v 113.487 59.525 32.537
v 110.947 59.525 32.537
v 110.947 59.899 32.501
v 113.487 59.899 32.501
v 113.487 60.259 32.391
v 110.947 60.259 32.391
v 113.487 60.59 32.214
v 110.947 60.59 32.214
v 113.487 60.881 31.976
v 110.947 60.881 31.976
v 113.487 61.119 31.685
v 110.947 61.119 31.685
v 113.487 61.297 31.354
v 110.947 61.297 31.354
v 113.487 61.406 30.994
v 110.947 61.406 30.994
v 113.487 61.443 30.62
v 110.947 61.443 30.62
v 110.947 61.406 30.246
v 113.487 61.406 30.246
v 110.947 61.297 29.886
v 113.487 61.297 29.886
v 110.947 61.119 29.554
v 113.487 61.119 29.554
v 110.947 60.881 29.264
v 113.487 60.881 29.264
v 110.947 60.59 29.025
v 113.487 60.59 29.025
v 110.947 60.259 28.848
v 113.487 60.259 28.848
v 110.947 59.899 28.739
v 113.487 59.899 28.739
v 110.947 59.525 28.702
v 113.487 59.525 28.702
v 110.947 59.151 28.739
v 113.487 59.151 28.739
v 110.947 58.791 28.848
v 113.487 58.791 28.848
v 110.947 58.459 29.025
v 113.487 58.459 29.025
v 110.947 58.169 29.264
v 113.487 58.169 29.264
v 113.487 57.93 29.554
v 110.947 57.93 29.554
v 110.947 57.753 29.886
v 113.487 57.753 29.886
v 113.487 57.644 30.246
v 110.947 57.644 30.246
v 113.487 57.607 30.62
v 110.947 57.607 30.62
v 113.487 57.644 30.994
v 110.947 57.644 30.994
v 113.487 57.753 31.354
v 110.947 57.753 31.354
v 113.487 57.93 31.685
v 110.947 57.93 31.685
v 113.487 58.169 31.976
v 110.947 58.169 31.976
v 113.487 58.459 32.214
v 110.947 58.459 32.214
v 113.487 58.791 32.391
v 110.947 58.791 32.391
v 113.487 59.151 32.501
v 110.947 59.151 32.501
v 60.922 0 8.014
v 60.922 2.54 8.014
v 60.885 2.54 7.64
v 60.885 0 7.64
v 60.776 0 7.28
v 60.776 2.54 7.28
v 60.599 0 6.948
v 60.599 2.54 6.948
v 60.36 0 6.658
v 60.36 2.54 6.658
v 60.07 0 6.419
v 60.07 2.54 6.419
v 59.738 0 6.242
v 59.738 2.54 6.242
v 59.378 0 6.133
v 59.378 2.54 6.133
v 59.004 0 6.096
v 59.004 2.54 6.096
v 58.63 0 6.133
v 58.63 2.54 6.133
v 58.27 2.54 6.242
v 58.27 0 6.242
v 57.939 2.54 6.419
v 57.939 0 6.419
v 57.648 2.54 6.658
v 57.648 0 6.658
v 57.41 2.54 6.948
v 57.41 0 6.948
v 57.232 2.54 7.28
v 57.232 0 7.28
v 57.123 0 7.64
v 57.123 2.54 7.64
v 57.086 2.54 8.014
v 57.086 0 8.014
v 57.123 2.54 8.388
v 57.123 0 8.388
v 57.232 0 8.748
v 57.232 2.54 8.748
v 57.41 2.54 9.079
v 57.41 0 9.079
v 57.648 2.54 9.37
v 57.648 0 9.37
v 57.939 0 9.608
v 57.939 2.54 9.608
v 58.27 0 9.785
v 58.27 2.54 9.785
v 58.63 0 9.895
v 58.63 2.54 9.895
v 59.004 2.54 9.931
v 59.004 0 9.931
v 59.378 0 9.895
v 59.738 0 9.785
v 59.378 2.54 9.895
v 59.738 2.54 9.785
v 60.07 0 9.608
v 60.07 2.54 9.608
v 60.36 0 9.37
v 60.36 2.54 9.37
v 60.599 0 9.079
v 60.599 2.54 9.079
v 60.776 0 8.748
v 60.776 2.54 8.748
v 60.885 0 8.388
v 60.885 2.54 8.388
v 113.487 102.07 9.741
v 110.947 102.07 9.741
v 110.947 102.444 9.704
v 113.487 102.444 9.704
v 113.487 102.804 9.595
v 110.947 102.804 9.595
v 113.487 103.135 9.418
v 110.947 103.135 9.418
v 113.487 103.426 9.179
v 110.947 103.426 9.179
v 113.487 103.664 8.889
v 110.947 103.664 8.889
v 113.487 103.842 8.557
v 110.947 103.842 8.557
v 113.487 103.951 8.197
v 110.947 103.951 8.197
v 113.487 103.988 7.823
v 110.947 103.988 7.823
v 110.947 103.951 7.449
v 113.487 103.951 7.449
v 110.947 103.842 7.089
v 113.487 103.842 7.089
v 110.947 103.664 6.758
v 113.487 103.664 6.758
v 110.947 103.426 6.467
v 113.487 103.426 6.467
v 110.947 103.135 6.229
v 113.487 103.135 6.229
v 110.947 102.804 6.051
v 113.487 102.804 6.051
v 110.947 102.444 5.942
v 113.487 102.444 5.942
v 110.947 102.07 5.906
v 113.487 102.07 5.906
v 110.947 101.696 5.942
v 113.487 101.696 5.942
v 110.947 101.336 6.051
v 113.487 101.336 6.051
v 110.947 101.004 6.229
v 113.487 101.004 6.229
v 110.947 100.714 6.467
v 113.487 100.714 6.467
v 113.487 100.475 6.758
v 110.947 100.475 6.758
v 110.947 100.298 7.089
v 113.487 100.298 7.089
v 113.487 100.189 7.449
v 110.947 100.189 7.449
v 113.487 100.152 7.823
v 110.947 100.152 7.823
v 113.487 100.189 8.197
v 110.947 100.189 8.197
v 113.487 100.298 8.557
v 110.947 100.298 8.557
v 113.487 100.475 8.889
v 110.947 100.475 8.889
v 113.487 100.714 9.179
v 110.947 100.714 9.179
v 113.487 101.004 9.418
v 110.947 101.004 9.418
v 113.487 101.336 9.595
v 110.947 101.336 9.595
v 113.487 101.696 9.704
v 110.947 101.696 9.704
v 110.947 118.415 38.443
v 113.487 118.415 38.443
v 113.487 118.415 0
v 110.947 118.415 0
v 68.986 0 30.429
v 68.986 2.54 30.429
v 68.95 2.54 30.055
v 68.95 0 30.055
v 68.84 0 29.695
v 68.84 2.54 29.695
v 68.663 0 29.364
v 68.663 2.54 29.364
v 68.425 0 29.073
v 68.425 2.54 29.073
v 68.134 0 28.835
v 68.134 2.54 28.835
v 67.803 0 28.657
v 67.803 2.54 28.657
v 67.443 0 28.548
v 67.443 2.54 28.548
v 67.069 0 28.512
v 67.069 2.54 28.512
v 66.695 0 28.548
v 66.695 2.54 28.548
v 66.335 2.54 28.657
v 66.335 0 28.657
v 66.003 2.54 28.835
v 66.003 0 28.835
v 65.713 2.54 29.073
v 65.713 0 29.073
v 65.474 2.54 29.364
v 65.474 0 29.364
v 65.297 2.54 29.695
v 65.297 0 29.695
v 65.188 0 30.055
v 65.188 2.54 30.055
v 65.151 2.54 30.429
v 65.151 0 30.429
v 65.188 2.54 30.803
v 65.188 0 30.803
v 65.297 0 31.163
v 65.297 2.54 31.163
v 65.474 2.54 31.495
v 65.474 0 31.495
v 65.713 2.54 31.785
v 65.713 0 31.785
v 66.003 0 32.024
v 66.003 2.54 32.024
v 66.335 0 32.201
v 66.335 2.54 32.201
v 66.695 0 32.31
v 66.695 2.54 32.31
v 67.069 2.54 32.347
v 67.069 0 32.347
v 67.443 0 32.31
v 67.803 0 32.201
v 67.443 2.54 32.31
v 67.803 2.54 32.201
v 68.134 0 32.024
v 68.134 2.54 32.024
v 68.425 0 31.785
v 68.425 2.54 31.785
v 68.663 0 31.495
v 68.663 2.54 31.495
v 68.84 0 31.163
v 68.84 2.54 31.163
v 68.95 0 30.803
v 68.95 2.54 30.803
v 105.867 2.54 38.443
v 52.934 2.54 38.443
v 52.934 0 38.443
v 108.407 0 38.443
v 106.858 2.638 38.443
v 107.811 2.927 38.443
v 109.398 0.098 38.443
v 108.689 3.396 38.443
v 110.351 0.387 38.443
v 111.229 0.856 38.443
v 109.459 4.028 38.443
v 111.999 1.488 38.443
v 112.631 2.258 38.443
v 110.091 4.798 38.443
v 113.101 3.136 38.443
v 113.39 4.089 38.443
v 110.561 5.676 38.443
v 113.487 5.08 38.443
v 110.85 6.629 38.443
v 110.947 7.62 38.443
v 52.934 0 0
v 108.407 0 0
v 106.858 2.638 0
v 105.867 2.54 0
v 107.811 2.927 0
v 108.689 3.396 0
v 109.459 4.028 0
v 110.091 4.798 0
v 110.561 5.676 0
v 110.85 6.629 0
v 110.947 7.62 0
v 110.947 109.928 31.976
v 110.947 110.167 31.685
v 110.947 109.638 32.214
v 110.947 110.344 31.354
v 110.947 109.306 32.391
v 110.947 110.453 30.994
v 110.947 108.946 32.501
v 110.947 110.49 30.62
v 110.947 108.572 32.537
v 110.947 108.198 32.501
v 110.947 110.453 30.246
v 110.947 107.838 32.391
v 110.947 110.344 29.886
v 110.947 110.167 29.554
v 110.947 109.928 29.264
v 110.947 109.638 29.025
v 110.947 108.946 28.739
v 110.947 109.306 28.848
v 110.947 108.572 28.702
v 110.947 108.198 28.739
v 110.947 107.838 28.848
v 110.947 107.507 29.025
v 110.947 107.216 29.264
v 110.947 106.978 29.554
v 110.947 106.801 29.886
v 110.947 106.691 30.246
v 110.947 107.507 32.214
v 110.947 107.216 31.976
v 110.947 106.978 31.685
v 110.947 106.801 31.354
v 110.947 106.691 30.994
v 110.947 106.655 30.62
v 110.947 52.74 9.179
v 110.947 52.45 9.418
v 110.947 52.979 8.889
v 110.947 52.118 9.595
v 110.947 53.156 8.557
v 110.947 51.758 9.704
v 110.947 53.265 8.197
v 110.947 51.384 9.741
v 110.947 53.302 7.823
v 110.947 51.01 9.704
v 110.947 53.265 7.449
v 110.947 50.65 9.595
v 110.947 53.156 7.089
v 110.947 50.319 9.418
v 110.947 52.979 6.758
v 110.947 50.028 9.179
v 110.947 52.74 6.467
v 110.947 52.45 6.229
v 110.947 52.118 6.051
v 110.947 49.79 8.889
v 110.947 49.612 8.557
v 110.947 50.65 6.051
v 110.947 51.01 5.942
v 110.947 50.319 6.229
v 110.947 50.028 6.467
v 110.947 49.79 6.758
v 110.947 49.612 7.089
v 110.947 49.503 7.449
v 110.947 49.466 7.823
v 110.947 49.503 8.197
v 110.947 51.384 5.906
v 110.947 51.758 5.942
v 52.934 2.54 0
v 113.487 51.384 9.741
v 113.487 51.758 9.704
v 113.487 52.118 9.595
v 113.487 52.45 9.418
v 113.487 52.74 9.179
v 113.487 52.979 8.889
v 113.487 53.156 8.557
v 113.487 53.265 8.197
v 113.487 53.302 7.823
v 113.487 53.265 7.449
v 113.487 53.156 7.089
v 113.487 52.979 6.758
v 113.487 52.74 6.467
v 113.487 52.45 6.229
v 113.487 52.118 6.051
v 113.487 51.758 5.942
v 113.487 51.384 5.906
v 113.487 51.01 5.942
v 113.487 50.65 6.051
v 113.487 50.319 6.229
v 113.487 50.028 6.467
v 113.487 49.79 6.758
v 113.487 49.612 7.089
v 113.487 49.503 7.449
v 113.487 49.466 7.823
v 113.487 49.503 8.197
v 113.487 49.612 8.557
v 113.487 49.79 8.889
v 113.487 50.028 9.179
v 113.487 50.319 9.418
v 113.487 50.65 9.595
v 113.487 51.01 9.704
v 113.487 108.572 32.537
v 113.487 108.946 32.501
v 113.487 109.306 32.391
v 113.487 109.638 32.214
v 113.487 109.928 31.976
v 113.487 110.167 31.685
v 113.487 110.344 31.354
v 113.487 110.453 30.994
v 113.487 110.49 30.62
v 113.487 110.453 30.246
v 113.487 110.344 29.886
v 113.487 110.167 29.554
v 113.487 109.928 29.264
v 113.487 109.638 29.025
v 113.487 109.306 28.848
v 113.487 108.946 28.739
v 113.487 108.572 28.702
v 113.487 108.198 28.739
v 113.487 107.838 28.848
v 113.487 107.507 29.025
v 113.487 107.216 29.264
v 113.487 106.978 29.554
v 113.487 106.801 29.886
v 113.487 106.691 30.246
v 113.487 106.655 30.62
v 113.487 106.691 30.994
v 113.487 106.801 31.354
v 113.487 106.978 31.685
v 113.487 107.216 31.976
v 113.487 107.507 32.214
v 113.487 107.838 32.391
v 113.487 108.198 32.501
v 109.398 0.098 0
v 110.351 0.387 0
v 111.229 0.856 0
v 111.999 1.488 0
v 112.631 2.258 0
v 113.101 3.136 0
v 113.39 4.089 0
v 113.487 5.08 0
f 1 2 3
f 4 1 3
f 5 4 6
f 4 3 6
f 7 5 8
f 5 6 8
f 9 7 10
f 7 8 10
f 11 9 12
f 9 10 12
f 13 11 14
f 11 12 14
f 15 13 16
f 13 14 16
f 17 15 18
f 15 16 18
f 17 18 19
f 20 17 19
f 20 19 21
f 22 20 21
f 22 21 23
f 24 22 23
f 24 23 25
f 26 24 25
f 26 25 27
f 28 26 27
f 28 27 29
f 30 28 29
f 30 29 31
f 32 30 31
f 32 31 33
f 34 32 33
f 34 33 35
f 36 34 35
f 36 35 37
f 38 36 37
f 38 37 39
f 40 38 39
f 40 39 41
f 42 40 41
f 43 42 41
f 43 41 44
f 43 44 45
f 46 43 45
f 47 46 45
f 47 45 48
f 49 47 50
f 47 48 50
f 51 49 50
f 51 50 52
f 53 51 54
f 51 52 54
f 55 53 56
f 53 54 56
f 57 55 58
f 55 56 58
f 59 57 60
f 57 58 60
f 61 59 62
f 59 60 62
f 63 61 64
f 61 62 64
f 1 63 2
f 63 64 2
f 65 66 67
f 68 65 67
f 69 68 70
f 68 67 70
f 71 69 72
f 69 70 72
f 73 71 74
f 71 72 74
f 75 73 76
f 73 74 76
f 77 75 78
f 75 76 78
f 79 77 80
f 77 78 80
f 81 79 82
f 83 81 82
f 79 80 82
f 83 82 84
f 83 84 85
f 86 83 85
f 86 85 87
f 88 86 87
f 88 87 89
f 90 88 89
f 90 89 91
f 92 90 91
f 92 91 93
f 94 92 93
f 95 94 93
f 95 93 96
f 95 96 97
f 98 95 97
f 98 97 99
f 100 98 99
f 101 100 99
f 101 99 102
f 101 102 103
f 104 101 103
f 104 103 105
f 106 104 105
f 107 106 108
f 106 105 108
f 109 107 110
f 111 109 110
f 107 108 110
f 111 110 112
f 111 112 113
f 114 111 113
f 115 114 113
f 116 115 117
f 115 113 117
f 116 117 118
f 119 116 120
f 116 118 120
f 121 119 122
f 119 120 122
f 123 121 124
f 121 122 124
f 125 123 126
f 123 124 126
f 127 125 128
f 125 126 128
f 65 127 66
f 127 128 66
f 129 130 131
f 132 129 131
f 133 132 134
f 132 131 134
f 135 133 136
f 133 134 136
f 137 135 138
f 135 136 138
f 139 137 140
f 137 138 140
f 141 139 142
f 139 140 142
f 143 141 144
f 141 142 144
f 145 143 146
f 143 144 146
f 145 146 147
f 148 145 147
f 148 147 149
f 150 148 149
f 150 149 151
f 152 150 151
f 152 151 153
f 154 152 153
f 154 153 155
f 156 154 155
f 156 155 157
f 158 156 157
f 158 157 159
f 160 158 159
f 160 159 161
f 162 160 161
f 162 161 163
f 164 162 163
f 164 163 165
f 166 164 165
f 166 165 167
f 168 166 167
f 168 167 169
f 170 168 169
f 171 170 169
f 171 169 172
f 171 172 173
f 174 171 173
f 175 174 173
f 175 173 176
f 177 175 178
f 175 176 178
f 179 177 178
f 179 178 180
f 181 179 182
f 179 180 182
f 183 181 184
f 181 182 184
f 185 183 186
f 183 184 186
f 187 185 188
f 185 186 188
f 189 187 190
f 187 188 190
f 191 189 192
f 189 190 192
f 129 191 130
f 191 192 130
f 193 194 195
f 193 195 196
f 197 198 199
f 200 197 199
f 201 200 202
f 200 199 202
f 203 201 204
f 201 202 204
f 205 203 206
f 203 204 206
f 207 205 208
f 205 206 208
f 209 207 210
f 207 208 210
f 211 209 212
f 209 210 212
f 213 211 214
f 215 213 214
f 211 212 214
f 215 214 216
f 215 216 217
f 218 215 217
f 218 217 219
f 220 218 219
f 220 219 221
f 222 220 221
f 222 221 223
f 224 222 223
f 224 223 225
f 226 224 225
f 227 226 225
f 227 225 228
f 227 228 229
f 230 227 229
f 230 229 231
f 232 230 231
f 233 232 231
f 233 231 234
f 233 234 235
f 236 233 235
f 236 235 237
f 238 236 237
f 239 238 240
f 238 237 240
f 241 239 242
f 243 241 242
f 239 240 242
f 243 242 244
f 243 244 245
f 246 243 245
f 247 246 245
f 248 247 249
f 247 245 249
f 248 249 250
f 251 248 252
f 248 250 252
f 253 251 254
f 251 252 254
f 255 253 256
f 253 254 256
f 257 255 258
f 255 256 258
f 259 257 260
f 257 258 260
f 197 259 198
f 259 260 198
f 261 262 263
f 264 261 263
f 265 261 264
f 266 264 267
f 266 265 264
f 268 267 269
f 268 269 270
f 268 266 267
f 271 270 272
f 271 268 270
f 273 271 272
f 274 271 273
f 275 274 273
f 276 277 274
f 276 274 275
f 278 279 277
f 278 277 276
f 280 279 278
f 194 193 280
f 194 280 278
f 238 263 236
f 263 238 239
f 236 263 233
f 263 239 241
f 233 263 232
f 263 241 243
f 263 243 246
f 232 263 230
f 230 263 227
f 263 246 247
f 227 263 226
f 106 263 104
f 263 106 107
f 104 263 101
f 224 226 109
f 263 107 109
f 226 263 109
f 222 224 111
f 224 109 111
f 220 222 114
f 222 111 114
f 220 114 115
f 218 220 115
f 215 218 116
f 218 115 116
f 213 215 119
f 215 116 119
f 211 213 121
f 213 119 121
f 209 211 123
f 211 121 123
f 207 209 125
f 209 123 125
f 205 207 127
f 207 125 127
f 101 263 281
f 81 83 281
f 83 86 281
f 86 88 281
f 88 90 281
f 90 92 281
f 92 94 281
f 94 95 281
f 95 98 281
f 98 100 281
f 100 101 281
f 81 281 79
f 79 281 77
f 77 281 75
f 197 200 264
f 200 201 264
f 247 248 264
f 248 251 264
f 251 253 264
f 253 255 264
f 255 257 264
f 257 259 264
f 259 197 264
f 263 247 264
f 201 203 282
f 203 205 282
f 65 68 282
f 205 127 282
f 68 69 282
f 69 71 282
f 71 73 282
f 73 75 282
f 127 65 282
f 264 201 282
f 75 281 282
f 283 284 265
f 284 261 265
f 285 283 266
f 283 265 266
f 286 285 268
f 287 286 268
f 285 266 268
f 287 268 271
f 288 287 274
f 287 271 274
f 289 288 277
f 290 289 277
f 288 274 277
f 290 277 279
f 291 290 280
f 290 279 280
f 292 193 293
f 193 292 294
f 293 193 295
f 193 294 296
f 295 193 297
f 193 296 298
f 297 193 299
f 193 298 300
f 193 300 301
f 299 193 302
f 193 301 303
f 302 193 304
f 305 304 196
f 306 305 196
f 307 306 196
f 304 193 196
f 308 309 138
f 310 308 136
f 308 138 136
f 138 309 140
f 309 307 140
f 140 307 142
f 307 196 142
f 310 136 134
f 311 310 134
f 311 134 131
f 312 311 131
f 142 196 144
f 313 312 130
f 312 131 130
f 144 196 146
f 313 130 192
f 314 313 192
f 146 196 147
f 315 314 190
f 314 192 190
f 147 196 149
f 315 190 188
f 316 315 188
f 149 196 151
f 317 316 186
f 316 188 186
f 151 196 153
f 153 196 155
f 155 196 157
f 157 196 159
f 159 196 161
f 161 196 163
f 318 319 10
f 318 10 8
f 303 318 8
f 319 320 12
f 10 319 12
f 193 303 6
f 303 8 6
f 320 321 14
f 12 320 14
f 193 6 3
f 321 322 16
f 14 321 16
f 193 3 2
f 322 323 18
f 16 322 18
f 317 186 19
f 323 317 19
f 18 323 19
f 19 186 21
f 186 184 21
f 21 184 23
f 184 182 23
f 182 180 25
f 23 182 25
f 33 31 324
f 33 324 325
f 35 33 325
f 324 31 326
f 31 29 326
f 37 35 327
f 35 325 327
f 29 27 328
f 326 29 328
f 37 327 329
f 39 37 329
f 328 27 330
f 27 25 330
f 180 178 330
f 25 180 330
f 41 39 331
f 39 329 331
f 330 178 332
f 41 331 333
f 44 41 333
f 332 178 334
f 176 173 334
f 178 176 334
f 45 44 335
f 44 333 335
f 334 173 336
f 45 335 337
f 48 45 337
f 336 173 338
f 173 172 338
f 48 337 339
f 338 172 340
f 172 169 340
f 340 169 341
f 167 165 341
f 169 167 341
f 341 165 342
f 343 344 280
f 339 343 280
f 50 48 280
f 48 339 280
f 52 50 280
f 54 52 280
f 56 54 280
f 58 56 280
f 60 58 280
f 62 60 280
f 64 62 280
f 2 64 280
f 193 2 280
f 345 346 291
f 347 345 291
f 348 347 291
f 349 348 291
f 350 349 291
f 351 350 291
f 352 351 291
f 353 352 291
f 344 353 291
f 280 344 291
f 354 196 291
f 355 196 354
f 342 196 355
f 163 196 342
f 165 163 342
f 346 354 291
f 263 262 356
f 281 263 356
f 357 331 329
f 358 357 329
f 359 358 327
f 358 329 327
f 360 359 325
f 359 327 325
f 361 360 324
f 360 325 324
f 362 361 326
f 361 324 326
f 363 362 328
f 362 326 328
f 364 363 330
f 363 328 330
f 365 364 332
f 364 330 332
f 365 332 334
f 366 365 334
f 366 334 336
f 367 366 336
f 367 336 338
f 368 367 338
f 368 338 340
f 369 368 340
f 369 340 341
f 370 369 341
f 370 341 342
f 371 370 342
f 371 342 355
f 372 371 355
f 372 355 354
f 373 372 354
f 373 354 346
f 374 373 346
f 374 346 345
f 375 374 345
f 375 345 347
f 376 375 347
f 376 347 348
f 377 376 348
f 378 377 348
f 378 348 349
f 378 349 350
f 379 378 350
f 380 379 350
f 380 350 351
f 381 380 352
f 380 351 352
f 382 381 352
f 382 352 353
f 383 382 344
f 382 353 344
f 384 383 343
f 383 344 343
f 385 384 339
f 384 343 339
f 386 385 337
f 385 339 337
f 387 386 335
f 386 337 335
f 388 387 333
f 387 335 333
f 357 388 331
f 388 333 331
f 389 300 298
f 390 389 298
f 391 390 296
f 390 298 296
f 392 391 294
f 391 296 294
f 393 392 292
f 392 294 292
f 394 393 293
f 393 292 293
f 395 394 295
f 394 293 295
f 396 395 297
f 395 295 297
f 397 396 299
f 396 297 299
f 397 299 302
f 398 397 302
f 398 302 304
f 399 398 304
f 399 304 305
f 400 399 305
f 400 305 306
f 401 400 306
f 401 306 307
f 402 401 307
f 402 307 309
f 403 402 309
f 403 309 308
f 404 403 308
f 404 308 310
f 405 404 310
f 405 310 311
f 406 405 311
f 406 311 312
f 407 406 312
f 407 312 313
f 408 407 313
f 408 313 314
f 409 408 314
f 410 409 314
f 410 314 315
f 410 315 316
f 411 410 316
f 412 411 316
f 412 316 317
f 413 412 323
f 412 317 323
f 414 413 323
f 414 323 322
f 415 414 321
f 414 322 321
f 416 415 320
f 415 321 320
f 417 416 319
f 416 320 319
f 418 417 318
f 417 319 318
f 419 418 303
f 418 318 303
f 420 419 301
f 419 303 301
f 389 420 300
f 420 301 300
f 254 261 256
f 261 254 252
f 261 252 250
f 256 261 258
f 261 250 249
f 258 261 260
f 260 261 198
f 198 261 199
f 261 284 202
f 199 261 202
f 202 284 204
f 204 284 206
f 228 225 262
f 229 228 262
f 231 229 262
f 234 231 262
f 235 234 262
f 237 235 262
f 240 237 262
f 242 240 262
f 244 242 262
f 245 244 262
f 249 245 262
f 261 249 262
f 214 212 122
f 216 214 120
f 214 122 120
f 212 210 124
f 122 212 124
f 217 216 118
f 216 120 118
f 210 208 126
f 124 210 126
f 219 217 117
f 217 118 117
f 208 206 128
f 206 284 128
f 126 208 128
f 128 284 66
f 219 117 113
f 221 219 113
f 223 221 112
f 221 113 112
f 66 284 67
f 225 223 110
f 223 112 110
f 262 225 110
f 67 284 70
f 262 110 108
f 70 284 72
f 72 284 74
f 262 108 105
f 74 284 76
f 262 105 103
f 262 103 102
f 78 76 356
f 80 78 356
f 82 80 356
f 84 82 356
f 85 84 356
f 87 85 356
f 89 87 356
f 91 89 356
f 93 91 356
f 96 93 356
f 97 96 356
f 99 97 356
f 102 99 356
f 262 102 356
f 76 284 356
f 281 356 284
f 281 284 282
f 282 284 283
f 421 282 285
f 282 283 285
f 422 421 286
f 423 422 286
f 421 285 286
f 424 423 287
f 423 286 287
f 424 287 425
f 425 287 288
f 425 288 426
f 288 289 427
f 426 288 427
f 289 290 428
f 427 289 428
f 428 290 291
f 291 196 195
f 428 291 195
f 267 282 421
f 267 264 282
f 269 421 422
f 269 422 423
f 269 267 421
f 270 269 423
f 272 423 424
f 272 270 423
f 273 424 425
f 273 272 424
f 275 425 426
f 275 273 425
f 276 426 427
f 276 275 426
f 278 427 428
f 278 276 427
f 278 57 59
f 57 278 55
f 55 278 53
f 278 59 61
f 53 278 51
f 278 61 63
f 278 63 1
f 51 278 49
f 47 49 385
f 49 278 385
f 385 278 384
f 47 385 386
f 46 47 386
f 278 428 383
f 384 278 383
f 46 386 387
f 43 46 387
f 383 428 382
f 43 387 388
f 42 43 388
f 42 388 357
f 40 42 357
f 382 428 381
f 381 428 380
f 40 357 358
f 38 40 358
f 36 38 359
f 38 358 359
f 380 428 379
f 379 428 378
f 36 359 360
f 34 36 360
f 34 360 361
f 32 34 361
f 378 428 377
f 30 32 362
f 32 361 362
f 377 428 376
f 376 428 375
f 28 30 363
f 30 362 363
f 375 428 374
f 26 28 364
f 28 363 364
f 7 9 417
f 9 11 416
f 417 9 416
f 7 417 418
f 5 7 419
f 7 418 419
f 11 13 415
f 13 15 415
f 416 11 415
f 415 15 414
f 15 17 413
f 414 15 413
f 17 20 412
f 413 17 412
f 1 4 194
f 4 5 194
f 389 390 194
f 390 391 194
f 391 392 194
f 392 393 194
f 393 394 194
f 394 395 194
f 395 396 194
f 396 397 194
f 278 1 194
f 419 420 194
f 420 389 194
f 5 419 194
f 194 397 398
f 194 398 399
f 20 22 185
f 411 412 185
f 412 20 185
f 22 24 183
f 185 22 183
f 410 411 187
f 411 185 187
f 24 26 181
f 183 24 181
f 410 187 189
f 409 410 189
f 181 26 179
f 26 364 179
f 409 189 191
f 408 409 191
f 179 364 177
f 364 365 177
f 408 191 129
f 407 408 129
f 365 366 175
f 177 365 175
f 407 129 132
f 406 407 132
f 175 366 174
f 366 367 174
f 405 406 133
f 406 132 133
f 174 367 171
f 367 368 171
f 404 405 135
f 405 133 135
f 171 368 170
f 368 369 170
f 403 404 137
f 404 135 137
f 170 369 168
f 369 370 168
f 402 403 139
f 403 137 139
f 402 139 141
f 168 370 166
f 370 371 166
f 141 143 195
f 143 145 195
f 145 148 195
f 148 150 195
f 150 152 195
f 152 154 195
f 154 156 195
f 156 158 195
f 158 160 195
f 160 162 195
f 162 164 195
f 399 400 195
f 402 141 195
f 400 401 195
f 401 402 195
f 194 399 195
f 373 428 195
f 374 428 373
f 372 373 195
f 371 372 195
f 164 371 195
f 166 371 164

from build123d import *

# Parameters (mm, degrees)
BOSS_EXTRUDE1_DEPTH = 38.4429
SKETCH2_R           = 1.9177
CUT_EXTRUDE1_DEPTH  = 3.54
SKETCH3_R           = 1.9177
CUT_EXTRUDE2_DEPTH  = 3.54
FILLET1_R           = 5.08
SKETCH4_W           = 52.9336
SKETCH4_H           = 38.4429
CUT_EXTRUDE4_DEPTH  = 3.54


with BuildPart() as part:
    # Sketch1 → Boss-Extrude1 (new body)
    with BuildSketch(Plane.XY):
        Polygon((0, 0), (113.4872, 0), (113.4872, 118.4148), (110.9472, 118.4148), (110.9472, 2.54), (0, 2.54), align=None)
    extrude(amount=BOSS_EXTRUDE1_DEPTH)

    # Sketch2 → Cut-Extrude1 (cut, through all)
    with BuildSketch(Plane(origin=(0, 2.54, 0), x_dir=(1, 0, 0), z_dir=(0, 1, 0))):
        with Locations((67.0687, -30.4292)):
            Circle(SKETCH2_R)
        with Locations((59.0042, -8.0137)):
            Circle(SKETCH2_R)
        with Locations((16.2052, -30.4292)):
            Circle(SKETCH2_R)
        with Locations((9.8806, -8.0137)):
            Circle(SKETCH2_R)
    extrude(amount=-CUT_EXTRUDE1_DEPTH, mode=Mode.SUBTRACT)

    # Sketch3 → Cut-Extrude2 (cut, through all)
    with BuildSketch(Plane.ZY.offset(-110.9472)):
        with Locations((7.8232, 51.3842)):
            Circle(SKETCH3_R)
        with Locations((30.6197, 59.5249)):
            Circle(SKETCH3_R)
        with Locations((7.8232, 102.0699)):
            Circle(SKETCH3_R)
        with Locations((30.6197, 108.5723)):
            Circle(SKETCH3_R)
    extrude(amount=-CUT_EXTRUDE2_DEPTH, mode=Mode.SUBTRACT)

    # Fillet1
    fillet1_edges = [part.edges().sort_by_distance(p)[0] for p in [
        (110.9472, 2.54, 19.22145),
        (113.4872, 0, 19.22145),
    ]]
    fillet(fillet1_edges, radius=FILLET1_R)

    # Sketch4 → Cut-Extrude4 (cut, through all)
    with BuildSketch(Plane(origin=(0, 2.54, 0), x_dir=(1, 0, 0), z_dir=(0, 1, 0))):
        with Locations((26.4668, -19.22145)):
            Rectangle(SKETCH4_W, SKETCH4_H)
    extrude(amount=-CUT_EXTRUDE4_DEPTH, mode=Mode.SUBTRACT)


solid = part.part
